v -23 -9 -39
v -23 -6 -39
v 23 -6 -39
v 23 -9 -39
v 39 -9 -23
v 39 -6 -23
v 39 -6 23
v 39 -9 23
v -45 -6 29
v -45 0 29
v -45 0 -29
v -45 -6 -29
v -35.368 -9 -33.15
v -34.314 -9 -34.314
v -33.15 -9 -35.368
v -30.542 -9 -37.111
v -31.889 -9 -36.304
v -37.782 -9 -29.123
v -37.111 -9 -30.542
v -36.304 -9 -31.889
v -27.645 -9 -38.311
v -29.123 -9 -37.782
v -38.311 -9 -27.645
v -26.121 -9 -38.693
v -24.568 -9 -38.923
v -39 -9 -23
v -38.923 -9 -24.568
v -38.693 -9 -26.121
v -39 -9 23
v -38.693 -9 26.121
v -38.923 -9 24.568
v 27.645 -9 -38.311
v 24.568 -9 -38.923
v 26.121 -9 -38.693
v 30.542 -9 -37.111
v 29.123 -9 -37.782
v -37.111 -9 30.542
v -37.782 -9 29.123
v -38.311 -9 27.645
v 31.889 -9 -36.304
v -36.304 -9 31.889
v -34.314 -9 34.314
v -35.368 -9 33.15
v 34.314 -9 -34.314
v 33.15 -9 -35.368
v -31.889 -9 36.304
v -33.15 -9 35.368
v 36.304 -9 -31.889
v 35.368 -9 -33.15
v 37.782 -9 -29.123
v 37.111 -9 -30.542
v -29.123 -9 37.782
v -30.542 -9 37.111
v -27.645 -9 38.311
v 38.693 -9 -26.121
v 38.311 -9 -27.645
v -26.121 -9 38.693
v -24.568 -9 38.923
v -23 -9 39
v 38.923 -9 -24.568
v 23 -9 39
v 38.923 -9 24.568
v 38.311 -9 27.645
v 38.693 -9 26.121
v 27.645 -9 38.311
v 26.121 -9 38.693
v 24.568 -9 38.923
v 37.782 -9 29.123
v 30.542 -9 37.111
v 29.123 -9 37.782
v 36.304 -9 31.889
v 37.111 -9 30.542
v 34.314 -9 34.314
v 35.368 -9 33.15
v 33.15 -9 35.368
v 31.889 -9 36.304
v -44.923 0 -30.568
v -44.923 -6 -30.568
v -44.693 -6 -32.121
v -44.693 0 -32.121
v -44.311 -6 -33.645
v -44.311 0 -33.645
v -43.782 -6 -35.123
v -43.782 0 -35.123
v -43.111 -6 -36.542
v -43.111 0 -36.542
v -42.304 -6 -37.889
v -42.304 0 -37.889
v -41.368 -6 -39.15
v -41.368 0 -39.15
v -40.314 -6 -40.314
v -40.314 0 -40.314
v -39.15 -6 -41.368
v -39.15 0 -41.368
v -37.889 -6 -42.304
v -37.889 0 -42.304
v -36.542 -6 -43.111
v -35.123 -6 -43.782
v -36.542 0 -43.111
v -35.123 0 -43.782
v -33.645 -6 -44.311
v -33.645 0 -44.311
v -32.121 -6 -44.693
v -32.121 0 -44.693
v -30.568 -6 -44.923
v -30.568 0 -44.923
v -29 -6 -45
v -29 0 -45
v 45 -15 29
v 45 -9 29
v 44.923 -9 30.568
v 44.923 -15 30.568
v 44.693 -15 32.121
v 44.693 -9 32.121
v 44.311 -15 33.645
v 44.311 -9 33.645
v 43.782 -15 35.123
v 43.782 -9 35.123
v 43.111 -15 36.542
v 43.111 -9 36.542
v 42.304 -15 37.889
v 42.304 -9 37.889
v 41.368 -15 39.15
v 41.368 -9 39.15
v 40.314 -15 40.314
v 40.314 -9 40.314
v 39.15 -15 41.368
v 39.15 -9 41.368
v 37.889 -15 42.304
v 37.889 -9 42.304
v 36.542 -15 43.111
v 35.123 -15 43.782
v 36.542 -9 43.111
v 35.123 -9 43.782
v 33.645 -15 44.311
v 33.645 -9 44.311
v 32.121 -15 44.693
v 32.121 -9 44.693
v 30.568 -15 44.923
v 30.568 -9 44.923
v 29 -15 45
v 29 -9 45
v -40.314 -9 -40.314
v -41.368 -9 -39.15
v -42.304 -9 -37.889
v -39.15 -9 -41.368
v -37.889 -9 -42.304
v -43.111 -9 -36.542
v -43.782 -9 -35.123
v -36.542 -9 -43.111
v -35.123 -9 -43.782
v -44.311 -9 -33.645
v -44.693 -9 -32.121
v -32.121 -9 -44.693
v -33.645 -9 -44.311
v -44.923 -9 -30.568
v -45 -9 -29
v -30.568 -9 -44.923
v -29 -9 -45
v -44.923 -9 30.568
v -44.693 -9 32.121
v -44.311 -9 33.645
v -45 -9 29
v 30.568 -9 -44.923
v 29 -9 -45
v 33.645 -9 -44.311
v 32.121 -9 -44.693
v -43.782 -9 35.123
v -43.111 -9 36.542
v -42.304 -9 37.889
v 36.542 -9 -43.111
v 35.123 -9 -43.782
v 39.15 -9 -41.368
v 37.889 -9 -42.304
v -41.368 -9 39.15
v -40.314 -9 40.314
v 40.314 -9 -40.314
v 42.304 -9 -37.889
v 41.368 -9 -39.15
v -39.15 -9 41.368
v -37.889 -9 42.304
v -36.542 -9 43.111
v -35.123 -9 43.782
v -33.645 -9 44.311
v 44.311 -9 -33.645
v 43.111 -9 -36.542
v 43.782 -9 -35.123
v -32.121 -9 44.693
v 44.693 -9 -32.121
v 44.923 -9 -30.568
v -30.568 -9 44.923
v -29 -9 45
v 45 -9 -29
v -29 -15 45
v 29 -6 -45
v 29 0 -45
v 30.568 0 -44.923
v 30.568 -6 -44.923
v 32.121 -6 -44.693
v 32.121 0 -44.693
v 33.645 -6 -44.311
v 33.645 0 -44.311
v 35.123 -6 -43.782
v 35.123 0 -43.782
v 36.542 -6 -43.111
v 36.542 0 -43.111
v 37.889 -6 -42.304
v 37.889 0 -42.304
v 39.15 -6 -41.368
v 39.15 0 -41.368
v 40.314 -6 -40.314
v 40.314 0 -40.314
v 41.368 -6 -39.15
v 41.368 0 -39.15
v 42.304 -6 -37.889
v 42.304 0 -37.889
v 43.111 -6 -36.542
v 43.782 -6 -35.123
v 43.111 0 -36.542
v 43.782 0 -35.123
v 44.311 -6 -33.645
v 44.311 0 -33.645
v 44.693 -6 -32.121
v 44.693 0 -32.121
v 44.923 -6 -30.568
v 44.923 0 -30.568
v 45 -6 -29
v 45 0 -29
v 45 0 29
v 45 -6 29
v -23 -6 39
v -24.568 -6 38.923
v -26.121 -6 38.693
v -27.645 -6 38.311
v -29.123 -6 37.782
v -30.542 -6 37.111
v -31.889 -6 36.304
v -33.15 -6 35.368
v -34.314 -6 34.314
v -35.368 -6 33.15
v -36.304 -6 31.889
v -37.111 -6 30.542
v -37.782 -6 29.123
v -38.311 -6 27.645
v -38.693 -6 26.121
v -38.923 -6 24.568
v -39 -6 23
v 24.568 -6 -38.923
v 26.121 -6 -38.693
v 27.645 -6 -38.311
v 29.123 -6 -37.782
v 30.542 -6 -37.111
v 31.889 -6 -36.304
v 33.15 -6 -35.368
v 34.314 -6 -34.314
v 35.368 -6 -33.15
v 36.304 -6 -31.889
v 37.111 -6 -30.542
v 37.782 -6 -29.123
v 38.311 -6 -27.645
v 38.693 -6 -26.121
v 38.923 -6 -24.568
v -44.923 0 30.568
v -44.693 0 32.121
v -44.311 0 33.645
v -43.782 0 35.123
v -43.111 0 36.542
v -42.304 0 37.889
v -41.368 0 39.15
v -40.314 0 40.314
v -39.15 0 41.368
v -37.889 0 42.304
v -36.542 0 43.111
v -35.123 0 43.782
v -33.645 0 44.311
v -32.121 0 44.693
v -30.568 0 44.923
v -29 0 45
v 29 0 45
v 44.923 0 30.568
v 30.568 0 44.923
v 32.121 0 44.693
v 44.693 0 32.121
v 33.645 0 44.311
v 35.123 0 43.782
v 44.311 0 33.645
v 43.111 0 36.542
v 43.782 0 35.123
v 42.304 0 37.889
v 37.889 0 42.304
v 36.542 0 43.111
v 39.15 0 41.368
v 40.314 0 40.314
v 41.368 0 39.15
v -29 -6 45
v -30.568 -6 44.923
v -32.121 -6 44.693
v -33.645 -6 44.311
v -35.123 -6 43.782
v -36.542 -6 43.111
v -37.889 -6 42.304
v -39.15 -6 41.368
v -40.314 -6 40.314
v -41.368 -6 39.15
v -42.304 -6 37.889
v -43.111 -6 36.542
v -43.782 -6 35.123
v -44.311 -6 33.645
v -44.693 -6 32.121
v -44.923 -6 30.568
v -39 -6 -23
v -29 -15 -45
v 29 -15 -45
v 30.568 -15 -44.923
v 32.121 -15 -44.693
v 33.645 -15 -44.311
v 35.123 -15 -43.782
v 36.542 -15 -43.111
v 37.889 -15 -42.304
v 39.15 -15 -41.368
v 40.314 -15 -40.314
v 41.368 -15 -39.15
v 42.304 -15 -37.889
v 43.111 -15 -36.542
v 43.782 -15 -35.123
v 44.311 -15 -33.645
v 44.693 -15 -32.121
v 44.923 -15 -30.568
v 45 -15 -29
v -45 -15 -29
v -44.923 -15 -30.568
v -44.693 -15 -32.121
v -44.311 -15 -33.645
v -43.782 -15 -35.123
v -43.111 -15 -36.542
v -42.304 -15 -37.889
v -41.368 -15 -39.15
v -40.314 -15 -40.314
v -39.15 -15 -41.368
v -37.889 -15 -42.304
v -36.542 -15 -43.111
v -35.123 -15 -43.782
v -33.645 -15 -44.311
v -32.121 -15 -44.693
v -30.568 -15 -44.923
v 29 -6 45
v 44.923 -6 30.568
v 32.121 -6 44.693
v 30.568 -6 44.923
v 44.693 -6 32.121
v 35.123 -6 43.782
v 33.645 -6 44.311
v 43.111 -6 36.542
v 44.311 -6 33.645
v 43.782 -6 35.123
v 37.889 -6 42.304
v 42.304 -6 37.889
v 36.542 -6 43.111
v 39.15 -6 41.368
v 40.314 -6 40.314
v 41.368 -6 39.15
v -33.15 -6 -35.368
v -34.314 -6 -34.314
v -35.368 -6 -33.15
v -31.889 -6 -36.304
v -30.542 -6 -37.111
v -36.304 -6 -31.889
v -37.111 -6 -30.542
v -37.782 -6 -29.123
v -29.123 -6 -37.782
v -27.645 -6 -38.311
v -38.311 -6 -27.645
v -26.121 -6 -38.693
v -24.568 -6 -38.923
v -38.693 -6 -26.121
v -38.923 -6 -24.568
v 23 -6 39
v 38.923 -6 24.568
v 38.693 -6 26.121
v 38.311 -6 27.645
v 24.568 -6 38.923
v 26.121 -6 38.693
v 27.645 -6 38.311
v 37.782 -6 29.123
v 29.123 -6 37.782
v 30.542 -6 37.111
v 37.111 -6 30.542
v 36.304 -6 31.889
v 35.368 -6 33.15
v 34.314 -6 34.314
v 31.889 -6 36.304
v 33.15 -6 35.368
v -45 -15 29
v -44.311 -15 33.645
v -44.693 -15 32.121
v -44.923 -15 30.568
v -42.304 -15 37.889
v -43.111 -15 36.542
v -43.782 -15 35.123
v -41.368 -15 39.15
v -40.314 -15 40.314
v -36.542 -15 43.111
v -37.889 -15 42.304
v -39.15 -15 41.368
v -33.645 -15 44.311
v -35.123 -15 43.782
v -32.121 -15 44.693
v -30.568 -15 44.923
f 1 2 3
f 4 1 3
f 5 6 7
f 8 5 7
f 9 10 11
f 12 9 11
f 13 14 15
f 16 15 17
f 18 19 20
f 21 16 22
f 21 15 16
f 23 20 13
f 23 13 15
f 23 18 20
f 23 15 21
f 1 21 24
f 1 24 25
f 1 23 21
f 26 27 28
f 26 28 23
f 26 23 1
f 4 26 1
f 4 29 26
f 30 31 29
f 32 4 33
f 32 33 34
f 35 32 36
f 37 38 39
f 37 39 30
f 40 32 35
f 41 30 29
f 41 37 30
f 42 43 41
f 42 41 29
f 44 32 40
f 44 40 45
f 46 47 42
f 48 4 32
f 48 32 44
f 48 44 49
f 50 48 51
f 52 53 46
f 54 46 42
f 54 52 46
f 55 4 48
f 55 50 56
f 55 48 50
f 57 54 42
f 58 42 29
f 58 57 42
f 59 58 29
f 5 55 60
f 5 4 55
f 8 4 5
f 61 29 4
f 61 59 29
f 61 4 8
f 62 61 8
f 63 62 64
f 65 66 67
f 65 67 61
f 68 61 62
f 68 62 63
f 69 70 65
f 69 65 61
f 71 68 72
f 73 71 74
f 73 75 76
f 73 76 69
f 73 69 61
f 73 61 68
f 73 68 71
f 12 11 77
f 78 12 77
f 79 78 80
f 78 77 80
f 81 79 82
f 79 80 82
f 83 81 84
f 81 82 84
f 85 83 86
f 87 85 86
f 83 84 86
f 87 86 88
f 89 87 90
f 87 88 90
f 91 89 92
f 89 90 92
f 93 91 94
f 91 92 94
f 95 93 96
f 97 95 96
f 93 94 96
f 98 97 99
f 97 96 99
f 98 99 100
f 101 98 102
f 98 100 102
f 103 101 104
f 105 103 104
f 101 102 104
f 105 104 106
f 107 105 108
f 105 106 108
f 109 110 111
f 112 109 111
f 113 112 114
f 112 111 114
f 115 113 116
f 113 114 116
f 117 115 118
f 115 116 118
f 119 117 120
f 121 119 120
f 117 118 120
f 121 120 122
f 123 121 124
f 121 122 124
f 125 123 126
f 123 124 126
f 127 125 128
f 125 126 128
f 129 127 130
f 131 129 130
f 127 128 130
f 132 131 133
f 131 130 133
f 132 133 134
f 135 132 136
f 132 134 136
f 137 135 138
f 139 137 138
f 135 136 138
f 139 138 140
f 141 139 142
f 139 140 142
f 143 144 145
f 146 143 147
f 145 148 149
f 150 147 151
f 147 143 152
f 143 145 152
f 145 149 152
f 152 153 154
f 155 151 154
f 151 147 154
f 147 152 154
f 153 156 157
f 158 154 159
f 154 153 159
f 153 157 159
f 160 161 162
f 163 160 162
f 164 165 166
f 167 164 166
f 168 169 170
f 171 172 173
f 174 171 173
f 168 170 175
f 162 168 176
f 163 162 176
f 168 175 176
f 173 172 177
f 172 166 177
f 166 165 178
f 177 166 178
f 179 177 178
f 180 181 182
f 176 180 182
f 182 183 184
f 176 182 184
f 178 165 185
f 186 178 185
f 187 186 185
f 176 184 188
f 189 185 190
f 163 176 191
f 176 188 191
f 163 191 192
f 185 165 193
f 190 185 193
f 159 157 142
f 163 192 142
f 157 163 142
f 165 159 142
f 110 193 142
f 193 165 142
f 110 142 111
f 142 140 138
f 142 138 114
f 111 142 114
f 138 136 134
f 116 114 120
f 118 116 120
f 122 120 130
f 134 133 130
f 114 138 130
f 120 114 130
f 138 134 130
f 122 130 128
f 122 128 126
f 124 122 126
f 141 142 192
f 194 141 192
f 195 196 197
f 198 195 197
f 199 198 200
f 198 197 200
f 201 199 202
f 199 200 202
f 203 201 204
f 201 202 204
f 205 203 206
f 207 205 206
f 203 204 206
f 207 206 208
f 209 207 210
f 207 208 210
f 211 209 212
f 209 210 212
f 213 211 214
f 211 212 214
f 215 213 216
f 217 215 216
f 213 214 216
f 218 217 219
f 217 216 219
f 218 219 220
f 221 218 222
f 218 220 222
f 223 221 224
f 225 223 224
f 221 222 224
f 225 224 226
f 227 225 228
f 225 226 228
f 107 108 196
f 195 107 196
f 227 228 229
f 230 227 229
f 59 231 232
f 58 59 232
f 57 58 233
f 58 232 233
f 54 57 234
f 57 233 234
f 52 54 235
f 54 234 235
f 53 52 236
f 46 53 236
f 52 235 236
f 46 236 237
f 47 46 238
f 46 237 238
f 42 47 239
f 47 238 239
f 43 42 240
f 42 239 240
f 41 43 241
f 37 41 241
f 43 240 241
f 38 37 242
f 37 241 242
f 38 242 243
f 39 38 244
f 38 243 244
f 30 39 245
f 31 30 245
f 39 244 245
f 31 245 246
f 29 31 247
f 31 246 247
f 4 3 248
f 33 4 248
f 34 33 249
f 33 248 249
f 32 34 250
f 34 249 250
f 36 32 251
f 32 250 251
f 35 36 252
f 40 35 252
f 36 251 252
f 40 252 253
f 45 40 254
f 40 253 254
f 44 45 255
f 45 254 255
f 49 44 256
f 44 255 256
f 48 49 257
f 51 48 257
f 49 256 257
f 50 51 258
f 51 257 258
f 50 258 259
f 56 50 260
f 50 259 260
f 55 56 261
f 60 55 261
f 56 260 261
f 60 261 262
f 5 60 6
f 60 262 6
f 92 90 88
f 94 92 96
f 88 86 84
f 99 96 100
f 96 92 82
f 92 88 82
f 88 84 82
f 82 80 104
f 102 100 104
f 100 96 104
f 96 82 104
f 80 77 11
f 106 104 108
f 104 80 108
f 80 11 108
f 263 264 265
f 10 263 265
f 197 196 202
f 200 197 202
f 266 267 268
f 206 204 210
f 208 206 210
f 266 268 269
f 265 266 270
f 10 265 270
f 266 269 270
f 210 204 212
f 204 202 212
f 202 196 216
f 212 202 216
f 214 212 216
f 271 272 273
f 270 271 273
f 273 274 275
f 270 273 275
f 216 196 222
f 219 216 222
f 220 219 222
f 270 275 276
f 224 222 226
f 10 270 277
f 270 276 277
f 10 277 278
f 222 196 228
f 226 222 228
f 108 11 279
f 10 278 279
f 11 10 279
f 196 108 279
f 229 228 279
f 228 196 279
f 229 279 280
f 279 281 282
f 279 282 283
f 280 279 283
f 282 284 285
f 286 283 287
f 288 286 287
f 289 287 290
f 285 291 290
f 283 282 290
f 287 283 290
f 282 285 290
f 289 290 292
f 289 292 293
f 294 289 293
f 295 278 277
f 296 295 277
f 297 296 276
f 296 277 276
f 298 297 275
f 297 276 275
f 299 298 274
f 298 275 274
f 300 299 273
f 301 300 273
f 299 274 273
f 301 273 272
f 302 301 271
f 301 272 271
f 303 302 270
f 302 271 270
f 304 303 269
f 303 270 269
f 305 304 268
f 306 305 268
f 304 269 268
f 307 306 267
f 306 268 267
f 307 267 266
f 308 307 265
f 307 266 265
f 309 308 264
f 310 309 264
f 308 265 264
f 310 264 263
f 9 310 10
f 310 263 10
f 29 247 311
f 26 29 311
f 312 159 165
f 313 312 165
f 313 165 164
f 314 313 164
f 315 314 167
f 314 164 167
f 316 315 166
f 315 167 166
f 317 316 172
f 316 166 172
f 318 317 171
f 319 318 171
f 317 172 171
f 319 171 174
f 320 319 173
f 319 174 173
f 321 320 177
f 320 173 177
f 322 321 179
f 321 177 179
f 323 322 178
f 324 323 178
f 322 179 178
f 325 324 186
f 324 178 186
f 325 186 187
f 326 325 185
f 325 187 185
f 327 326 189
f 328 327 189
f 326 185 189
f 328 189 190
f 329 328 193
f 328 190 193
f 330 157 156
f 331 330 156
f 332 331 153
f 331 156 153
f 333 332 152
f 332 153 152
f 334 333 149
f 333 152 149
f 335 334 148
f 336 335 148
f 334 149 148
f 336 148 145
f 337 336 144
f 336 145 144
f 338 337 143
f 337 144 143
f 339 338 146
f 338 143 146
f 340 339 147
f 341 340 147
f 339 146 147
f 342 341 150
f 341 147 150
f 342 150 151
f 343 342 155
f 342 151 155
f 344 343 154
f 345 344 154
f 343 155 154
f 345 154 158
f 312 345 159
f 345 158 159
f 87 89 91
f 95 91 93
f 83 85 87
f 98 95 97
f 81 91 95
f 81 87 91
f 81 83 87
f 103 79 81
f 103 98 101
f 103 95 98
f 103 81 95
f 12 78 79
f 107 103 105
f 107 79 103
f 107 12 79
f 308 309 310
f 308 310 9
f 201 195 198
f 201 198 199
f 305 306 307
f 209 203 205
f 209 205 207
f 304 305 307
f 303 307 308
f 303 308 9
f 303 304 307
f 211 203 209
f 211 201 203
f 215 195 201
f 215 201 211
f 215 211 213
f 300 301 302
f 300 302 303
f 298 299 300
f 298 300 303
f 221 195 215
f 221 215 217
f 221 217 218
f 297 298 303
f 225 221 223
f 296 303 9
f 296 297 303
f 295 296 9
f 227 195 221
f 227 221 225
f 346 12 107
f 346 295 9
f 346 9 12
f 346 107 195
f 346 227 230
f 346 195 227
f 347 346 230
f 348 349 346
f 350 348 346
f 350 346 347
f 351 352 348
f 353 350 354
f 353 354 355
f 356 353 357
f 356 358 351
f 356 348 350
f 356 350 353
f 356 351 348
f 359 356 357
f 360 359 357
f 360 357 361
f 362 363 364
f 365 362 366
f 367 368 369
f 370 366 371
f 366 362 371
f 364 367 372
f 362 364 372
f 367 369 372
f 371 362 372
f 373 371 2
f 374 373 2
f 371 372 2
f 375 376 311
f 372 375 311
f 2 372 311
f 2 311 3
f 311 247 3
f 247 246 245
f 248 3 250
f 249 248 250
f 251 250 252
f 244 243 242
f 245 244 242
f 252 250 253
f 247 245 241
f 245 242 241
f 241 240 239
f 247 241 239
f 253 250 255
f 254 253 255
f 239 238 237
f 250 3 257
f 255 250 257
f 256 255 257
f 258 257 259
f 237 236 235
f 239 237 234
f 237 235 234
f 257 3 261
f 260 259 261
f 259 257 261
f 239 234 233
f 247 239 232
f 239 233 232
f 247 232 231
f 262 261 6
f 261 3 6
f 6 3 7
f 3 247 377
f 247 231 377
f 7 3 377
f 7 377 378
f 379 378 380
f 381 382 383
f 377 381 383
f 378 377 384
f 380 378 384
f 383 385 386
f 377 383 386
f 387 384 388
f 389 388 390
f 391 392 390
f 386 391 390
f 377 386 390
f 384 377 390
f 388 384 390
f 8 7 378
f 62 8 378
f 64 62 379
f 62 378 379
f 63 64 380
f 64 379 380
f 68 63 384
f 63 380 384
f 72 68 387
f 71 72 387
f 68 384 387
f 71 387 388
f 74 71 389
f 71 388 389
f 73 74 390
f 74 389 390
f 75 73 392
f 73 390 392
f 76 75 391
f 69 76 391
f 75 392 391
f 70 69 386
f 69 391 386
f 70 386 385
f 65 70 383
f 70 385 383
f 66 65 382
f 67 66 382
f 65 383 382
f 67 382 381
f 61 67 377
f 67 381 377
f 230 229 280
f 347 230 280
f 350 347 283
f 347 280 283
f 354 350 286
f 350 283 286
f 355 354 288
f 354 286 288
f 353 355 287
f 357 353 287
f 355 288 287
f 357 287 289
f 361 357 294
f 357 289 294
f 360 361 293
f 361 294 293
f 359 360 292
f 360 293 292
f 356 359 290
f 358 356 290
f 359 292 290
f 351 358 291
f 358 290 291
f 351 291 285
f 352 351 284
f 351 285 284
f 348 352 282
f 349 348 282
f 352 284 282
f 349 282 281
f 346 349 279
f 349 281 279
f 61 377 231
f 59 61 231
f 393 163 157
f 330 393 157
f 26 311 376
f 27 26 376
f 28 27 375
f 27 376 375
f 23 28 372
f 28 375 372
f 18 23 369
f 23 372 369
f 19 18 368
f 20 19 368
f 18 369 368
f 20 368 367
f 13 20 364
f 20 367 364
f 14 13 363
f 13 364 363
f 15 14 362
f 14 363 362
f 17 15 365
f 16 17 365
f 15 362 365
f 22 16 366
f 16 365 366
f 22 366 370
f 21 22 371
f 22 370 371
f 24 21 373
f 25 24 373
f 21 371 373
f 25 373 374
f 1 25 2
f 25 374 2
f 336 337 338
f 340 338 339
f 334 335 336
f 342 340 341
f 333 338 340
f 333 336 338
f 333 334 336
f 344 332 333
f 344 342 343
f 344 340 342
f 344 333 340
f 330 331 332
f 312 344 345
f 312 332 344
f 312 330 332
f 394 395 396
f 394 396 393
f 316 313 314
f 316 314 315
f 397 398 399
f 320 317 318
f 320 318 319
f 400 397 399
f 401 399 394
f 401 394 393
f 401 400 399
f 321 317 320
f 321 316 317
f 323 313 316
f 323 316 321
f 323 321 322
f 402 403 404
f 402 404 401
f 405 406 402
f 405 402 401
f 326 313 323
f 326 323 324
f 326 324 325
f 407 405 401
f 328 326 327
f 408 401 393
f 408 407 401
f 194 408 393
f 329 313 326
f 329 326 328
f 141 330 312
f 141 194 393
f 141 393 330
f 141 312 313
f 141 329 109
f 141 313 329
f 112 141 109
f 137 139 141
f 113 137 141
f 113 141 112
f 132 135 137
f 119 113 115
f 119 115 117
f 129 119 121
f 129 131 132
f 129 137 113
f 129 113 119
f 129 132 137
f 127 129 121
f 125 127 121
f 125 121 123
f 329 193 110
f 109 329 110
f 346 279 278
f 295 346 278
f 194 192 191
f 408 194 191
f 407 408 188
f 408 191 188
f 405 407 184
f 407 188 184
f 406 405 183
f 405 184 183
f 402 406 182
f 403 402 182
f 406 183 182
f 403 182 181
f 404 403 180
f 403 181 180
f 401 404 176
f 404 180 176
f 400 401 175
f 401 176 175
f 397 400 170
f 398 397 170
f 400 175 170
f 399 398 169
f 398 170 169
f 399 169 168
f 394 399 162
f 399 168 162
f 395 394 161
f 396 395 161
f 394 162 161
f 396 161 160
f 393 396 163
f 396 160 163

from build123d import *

# Parameters (mm, degrees)
F1_DEPTH = 6
F3_DEPTH = 3
F5_DEPTH = 6


with BuildPart() as f1:
    # F0 (on Front) → F1 (new body)
    with BuildSketch(Plane.XZ):
        with BuildLine():
            Line((29, 45), (-29, 45))
            ThreePointArc((-29, 45), (-40.313708499, 40.313708499), (-45, 29))
            Line((-45, 29), (-45, -29))
            ThreePointArc((-45, -29), (-40.313708499, -40.313708499), (-29, -45))
            Line((-29, -45), (29, -45))
            ThreePointArc((29, -45), (40.313708499, -40.313708499), (45, -29))
            Line((45, -29), (45, 29))
            ThreePointArc((45, 29), (40.313708499, 40.313708499), (29, 45))
        make_face()
    extrude(amount=F1_DEPTH)


with BuildPart() as f3:
    # F2 (on face) → F3 (new body)
    with BuildSketch(Plane.XZ.offset(6)):
        with BuildLine():
            Line((23, 39), (-23, 39))
            ThreePointArc((-23, 39), (-34.313708499, 34.313708499), (-39, 23))
            Line((-39, 23), (-39, -23))
            ThreePointArc((-39, -23), (-34.313708499, -34.313708499), (-23, -39))
            Line((-23, -39), (23, -39))
            ThreePointArc((23, -39), (34.313708499, -34.313708499), (39, -23))
            Line((39, -23), (39, 23))
            ThreePointArc((39, 23), (34.313708499, 34.313708499), (23, 39))
        make_face()
    extrude(amount=F3_DEPTH)


with BuildPart() as f5:
    # F4 (on face) → F5 (new body)
    with BuildSketch(Plane.XZ.offset(9)):
        with BuildLine():
            Line((29, 45), (-29, 45))
            ThreePointArc((-29, 45), (-40.313708499, 40.313708499), (-45, 29))
            Line((-45, 29), (-45, -29))
            ThreePointArc((-45, -29), (-40.313708499, -40.313708499), (-29, -45))
            Line((-29, -45), (29, -45))
            ThreePointArc((29, -45), (40.313708499, -40.313708499), (45, -29))
            Line((45, -29), (45, 29))
            ThreePointArc((45, 29), (40.313708499, 40.313708499), (29, 45))
        make_face()
    extrude(amount=F5_DEPTH)


solid = Compound([f1.part, f3.part, f5.part])
